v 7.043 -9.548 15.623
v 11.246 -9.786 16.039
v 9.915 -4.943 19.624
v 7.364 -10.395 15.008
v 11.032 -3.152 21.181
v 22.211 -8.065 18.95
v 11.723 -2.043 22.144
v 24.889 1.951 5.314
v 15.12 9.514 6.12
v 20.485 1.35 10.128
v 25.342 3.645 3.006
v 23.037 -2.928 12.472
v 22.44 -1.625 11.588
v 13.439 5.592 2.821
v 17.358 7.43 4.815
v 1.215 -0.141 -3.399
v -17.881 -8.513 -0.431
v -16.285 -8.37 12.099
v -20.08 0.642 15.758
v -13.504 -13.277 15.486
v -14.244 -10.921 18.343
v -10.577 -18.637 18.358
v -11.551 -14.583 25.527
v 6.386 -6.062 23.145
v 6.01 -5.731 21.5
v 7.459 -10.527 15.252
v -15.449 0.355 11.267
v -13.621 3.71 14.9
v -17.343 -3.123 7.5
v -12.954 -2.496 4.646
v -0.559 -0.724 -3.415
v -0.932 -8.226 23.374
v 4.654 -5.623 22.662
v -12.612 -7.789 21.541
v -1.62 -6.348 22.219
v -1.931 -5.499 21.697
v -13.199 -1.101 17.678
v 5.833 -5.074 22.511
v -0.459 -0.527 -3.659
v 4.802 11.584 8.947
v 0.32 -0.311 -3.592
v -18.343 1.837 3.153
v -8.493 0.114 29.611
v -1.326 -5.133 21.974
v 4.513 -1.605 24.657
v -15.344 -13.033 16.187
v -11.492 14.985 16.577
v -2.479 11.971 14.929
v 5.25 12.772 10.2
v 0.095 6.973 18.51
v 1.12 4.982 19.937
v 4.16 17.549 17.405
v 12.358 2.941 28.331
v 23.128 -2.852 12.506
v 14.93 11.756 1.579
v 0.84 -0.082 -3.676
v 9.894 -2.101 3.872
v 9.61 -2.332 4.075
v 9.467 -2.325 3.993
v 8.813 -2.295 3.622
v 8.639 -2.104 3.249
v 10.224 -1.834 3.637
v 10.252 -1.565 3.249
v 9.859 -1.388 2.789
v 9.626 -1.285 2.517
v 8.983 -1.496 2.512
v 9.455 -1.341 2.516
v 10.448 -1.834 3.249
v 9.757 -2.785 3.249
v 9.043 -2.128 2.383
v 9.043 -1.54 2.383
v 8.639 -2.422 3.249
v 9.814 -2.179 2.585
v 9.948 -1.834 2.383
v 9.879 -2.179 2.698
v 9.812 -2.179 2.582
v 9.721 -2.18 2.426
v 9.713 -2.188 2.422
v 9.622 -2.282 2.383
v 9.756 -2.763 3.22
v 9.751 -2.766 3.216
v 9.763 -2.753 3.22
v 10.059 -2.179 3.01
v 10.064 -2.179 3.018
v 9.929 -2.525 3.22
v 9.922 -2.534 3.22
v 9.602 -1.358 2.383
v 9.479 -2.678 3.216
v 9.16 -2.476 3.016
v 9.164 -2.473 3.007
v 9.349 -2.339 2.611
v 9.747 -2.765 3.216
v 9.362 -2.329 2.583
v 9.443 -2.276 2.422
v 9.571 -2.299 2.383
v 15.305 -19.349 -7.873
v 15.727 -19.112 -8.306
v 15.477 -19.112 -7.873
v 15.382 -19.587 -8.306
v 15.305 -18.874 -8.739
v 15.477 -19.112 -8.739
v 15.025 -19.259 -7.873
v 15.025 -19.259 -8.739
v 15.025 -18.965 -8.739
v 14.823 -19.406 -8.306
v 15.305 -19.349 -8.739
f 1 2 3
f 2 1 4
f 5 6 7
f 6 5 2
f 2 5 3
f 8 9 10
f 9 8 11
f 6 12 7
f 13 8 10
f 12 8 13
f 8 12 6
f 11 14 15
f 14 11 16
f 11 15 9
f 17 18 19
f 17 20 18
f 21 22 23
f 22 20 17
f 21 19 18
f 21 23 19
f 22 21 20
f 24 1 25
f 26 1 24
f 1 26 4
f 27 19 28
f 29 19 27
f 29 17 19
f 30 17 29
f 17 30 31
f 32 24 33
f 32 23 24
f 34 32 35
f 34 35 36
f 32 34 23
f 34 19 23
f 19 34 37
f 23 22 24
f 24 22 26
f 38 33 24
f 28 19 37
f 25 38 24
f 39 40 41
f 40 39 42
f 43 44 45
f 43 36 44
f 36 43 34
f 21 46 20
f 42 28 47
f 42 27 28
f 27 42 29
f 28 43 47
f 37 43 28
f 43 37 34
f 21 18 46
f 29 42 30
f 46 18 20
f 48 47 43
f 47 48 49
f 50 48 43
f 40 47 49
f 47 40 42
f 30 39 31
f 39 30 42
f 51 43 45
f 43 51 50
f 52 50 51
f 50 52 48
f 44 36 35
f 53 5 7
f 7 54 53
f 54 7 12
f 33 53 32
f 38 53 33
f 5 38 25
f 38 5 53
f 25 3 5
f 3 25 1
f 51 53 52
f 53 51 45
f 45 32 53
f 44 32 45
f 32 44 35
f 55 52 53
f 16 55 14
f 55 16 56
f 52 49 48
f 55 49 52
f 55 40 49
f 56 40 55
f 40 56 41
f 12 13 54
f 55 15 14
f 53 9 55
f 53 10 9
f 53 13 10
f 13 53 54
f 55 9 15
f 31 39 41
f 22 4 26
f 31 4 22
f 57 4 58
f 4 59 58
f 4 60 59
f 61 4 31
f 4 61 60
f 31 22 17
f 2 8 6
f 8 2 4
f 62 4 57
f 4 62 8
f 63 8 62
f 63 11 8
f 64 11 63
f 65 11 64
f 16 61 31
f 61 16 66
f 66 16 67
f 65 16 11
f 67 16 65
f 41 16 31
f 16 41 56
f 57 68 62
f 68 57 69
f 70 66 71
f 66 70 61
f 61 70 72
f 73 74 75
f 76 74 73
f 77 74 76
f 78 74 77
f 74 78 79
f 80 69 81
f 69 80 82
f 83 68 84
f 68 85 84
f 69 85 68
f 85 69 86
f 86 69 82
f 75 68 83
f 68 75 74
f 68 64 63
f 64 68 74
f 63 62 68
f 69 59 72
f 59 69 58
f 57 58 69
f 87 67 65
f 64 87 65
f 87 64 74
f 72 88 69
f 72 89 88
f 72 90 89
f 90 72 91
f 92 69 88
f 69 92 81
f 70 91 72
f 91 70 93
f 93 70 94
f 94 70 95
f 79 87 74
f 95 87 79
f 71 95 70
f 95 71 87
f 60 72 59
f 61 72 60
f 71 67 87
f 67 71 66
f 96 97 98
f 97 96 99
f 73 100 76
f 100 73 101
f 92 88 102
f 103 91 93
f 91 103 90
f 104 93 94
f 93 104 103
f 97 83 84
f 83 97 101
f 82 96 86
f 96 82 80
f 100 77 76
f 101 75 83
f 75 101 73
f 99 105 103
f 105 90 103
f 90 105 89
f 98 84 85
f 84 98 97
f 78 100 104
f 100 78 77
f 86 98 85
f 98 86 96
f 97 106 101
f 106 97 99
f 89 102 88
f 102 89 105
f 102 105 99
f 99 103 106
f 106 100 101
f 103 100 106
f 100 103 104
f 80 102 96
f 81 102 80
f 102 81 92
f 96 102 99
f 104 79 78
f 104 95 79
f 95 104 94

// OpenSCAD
seed=rands(0,100,100 ) ;
 n= rands(-1,1,3,seed[0]);
o=rands(-10,10,3,seed[1]);
echo(n,o);
color(rands(0,1,3))union()planeCrop(  60,n,o ) 
translate([0,0,10])union() {
    for (t = [0: 5]) {
        r = rands(0, 360, 3 ,seed[t]);
       c = rands(0, 1, 3,seed[t]);
     color(c)   rotate(r) cube(20);
    }
}

#
color("red")  translate(o){
  sphere(1);
 hull(){
  sphere(.5);
translate( n*20) sphere(.5);
}
look_at(n)square(20,true);}

module crop(maxh = 100) {
    intersection() {
        color() {
            children();
        }
        linear_extrude(maxh)
        hull()
        projection() {
            children();
        }
    }
}
 module planeCrop(maxh = 100,normal,origin) {
     if(normal==[0,0,1]) // flat z normal special case
         {mirror([0,0,1]) 
           translate(-origin)
              crop(maxh)    
                 translate(origin)
                    color() {
                      mirror([0,0,1])  children();
                    }
             }
     else 
         {
     
  translate(origin)
  look_at(-normal )
         crop(maxh)    
             look_at(-normal)
               translate(-origin)
                    color() {
                        children();
                    }
               }
           }


module look_at(lookpoint,origin=[0,0,0],rotatefrom=[0,0,1]){
rotations=look_at(lookpoint,origin ,rotatefrom);
rotate(rotations[0],rotations[1]) children();
}
function look_at(p,o=[0,0,0],up=[0,0,1])=let(a=up,b=p-o,c=cross(a,b) ,d=angle(a,b))[d,c];

function angle (a,b)=atan2(sqrt((cross(a, b)*cross(a, b))), (a* b));
